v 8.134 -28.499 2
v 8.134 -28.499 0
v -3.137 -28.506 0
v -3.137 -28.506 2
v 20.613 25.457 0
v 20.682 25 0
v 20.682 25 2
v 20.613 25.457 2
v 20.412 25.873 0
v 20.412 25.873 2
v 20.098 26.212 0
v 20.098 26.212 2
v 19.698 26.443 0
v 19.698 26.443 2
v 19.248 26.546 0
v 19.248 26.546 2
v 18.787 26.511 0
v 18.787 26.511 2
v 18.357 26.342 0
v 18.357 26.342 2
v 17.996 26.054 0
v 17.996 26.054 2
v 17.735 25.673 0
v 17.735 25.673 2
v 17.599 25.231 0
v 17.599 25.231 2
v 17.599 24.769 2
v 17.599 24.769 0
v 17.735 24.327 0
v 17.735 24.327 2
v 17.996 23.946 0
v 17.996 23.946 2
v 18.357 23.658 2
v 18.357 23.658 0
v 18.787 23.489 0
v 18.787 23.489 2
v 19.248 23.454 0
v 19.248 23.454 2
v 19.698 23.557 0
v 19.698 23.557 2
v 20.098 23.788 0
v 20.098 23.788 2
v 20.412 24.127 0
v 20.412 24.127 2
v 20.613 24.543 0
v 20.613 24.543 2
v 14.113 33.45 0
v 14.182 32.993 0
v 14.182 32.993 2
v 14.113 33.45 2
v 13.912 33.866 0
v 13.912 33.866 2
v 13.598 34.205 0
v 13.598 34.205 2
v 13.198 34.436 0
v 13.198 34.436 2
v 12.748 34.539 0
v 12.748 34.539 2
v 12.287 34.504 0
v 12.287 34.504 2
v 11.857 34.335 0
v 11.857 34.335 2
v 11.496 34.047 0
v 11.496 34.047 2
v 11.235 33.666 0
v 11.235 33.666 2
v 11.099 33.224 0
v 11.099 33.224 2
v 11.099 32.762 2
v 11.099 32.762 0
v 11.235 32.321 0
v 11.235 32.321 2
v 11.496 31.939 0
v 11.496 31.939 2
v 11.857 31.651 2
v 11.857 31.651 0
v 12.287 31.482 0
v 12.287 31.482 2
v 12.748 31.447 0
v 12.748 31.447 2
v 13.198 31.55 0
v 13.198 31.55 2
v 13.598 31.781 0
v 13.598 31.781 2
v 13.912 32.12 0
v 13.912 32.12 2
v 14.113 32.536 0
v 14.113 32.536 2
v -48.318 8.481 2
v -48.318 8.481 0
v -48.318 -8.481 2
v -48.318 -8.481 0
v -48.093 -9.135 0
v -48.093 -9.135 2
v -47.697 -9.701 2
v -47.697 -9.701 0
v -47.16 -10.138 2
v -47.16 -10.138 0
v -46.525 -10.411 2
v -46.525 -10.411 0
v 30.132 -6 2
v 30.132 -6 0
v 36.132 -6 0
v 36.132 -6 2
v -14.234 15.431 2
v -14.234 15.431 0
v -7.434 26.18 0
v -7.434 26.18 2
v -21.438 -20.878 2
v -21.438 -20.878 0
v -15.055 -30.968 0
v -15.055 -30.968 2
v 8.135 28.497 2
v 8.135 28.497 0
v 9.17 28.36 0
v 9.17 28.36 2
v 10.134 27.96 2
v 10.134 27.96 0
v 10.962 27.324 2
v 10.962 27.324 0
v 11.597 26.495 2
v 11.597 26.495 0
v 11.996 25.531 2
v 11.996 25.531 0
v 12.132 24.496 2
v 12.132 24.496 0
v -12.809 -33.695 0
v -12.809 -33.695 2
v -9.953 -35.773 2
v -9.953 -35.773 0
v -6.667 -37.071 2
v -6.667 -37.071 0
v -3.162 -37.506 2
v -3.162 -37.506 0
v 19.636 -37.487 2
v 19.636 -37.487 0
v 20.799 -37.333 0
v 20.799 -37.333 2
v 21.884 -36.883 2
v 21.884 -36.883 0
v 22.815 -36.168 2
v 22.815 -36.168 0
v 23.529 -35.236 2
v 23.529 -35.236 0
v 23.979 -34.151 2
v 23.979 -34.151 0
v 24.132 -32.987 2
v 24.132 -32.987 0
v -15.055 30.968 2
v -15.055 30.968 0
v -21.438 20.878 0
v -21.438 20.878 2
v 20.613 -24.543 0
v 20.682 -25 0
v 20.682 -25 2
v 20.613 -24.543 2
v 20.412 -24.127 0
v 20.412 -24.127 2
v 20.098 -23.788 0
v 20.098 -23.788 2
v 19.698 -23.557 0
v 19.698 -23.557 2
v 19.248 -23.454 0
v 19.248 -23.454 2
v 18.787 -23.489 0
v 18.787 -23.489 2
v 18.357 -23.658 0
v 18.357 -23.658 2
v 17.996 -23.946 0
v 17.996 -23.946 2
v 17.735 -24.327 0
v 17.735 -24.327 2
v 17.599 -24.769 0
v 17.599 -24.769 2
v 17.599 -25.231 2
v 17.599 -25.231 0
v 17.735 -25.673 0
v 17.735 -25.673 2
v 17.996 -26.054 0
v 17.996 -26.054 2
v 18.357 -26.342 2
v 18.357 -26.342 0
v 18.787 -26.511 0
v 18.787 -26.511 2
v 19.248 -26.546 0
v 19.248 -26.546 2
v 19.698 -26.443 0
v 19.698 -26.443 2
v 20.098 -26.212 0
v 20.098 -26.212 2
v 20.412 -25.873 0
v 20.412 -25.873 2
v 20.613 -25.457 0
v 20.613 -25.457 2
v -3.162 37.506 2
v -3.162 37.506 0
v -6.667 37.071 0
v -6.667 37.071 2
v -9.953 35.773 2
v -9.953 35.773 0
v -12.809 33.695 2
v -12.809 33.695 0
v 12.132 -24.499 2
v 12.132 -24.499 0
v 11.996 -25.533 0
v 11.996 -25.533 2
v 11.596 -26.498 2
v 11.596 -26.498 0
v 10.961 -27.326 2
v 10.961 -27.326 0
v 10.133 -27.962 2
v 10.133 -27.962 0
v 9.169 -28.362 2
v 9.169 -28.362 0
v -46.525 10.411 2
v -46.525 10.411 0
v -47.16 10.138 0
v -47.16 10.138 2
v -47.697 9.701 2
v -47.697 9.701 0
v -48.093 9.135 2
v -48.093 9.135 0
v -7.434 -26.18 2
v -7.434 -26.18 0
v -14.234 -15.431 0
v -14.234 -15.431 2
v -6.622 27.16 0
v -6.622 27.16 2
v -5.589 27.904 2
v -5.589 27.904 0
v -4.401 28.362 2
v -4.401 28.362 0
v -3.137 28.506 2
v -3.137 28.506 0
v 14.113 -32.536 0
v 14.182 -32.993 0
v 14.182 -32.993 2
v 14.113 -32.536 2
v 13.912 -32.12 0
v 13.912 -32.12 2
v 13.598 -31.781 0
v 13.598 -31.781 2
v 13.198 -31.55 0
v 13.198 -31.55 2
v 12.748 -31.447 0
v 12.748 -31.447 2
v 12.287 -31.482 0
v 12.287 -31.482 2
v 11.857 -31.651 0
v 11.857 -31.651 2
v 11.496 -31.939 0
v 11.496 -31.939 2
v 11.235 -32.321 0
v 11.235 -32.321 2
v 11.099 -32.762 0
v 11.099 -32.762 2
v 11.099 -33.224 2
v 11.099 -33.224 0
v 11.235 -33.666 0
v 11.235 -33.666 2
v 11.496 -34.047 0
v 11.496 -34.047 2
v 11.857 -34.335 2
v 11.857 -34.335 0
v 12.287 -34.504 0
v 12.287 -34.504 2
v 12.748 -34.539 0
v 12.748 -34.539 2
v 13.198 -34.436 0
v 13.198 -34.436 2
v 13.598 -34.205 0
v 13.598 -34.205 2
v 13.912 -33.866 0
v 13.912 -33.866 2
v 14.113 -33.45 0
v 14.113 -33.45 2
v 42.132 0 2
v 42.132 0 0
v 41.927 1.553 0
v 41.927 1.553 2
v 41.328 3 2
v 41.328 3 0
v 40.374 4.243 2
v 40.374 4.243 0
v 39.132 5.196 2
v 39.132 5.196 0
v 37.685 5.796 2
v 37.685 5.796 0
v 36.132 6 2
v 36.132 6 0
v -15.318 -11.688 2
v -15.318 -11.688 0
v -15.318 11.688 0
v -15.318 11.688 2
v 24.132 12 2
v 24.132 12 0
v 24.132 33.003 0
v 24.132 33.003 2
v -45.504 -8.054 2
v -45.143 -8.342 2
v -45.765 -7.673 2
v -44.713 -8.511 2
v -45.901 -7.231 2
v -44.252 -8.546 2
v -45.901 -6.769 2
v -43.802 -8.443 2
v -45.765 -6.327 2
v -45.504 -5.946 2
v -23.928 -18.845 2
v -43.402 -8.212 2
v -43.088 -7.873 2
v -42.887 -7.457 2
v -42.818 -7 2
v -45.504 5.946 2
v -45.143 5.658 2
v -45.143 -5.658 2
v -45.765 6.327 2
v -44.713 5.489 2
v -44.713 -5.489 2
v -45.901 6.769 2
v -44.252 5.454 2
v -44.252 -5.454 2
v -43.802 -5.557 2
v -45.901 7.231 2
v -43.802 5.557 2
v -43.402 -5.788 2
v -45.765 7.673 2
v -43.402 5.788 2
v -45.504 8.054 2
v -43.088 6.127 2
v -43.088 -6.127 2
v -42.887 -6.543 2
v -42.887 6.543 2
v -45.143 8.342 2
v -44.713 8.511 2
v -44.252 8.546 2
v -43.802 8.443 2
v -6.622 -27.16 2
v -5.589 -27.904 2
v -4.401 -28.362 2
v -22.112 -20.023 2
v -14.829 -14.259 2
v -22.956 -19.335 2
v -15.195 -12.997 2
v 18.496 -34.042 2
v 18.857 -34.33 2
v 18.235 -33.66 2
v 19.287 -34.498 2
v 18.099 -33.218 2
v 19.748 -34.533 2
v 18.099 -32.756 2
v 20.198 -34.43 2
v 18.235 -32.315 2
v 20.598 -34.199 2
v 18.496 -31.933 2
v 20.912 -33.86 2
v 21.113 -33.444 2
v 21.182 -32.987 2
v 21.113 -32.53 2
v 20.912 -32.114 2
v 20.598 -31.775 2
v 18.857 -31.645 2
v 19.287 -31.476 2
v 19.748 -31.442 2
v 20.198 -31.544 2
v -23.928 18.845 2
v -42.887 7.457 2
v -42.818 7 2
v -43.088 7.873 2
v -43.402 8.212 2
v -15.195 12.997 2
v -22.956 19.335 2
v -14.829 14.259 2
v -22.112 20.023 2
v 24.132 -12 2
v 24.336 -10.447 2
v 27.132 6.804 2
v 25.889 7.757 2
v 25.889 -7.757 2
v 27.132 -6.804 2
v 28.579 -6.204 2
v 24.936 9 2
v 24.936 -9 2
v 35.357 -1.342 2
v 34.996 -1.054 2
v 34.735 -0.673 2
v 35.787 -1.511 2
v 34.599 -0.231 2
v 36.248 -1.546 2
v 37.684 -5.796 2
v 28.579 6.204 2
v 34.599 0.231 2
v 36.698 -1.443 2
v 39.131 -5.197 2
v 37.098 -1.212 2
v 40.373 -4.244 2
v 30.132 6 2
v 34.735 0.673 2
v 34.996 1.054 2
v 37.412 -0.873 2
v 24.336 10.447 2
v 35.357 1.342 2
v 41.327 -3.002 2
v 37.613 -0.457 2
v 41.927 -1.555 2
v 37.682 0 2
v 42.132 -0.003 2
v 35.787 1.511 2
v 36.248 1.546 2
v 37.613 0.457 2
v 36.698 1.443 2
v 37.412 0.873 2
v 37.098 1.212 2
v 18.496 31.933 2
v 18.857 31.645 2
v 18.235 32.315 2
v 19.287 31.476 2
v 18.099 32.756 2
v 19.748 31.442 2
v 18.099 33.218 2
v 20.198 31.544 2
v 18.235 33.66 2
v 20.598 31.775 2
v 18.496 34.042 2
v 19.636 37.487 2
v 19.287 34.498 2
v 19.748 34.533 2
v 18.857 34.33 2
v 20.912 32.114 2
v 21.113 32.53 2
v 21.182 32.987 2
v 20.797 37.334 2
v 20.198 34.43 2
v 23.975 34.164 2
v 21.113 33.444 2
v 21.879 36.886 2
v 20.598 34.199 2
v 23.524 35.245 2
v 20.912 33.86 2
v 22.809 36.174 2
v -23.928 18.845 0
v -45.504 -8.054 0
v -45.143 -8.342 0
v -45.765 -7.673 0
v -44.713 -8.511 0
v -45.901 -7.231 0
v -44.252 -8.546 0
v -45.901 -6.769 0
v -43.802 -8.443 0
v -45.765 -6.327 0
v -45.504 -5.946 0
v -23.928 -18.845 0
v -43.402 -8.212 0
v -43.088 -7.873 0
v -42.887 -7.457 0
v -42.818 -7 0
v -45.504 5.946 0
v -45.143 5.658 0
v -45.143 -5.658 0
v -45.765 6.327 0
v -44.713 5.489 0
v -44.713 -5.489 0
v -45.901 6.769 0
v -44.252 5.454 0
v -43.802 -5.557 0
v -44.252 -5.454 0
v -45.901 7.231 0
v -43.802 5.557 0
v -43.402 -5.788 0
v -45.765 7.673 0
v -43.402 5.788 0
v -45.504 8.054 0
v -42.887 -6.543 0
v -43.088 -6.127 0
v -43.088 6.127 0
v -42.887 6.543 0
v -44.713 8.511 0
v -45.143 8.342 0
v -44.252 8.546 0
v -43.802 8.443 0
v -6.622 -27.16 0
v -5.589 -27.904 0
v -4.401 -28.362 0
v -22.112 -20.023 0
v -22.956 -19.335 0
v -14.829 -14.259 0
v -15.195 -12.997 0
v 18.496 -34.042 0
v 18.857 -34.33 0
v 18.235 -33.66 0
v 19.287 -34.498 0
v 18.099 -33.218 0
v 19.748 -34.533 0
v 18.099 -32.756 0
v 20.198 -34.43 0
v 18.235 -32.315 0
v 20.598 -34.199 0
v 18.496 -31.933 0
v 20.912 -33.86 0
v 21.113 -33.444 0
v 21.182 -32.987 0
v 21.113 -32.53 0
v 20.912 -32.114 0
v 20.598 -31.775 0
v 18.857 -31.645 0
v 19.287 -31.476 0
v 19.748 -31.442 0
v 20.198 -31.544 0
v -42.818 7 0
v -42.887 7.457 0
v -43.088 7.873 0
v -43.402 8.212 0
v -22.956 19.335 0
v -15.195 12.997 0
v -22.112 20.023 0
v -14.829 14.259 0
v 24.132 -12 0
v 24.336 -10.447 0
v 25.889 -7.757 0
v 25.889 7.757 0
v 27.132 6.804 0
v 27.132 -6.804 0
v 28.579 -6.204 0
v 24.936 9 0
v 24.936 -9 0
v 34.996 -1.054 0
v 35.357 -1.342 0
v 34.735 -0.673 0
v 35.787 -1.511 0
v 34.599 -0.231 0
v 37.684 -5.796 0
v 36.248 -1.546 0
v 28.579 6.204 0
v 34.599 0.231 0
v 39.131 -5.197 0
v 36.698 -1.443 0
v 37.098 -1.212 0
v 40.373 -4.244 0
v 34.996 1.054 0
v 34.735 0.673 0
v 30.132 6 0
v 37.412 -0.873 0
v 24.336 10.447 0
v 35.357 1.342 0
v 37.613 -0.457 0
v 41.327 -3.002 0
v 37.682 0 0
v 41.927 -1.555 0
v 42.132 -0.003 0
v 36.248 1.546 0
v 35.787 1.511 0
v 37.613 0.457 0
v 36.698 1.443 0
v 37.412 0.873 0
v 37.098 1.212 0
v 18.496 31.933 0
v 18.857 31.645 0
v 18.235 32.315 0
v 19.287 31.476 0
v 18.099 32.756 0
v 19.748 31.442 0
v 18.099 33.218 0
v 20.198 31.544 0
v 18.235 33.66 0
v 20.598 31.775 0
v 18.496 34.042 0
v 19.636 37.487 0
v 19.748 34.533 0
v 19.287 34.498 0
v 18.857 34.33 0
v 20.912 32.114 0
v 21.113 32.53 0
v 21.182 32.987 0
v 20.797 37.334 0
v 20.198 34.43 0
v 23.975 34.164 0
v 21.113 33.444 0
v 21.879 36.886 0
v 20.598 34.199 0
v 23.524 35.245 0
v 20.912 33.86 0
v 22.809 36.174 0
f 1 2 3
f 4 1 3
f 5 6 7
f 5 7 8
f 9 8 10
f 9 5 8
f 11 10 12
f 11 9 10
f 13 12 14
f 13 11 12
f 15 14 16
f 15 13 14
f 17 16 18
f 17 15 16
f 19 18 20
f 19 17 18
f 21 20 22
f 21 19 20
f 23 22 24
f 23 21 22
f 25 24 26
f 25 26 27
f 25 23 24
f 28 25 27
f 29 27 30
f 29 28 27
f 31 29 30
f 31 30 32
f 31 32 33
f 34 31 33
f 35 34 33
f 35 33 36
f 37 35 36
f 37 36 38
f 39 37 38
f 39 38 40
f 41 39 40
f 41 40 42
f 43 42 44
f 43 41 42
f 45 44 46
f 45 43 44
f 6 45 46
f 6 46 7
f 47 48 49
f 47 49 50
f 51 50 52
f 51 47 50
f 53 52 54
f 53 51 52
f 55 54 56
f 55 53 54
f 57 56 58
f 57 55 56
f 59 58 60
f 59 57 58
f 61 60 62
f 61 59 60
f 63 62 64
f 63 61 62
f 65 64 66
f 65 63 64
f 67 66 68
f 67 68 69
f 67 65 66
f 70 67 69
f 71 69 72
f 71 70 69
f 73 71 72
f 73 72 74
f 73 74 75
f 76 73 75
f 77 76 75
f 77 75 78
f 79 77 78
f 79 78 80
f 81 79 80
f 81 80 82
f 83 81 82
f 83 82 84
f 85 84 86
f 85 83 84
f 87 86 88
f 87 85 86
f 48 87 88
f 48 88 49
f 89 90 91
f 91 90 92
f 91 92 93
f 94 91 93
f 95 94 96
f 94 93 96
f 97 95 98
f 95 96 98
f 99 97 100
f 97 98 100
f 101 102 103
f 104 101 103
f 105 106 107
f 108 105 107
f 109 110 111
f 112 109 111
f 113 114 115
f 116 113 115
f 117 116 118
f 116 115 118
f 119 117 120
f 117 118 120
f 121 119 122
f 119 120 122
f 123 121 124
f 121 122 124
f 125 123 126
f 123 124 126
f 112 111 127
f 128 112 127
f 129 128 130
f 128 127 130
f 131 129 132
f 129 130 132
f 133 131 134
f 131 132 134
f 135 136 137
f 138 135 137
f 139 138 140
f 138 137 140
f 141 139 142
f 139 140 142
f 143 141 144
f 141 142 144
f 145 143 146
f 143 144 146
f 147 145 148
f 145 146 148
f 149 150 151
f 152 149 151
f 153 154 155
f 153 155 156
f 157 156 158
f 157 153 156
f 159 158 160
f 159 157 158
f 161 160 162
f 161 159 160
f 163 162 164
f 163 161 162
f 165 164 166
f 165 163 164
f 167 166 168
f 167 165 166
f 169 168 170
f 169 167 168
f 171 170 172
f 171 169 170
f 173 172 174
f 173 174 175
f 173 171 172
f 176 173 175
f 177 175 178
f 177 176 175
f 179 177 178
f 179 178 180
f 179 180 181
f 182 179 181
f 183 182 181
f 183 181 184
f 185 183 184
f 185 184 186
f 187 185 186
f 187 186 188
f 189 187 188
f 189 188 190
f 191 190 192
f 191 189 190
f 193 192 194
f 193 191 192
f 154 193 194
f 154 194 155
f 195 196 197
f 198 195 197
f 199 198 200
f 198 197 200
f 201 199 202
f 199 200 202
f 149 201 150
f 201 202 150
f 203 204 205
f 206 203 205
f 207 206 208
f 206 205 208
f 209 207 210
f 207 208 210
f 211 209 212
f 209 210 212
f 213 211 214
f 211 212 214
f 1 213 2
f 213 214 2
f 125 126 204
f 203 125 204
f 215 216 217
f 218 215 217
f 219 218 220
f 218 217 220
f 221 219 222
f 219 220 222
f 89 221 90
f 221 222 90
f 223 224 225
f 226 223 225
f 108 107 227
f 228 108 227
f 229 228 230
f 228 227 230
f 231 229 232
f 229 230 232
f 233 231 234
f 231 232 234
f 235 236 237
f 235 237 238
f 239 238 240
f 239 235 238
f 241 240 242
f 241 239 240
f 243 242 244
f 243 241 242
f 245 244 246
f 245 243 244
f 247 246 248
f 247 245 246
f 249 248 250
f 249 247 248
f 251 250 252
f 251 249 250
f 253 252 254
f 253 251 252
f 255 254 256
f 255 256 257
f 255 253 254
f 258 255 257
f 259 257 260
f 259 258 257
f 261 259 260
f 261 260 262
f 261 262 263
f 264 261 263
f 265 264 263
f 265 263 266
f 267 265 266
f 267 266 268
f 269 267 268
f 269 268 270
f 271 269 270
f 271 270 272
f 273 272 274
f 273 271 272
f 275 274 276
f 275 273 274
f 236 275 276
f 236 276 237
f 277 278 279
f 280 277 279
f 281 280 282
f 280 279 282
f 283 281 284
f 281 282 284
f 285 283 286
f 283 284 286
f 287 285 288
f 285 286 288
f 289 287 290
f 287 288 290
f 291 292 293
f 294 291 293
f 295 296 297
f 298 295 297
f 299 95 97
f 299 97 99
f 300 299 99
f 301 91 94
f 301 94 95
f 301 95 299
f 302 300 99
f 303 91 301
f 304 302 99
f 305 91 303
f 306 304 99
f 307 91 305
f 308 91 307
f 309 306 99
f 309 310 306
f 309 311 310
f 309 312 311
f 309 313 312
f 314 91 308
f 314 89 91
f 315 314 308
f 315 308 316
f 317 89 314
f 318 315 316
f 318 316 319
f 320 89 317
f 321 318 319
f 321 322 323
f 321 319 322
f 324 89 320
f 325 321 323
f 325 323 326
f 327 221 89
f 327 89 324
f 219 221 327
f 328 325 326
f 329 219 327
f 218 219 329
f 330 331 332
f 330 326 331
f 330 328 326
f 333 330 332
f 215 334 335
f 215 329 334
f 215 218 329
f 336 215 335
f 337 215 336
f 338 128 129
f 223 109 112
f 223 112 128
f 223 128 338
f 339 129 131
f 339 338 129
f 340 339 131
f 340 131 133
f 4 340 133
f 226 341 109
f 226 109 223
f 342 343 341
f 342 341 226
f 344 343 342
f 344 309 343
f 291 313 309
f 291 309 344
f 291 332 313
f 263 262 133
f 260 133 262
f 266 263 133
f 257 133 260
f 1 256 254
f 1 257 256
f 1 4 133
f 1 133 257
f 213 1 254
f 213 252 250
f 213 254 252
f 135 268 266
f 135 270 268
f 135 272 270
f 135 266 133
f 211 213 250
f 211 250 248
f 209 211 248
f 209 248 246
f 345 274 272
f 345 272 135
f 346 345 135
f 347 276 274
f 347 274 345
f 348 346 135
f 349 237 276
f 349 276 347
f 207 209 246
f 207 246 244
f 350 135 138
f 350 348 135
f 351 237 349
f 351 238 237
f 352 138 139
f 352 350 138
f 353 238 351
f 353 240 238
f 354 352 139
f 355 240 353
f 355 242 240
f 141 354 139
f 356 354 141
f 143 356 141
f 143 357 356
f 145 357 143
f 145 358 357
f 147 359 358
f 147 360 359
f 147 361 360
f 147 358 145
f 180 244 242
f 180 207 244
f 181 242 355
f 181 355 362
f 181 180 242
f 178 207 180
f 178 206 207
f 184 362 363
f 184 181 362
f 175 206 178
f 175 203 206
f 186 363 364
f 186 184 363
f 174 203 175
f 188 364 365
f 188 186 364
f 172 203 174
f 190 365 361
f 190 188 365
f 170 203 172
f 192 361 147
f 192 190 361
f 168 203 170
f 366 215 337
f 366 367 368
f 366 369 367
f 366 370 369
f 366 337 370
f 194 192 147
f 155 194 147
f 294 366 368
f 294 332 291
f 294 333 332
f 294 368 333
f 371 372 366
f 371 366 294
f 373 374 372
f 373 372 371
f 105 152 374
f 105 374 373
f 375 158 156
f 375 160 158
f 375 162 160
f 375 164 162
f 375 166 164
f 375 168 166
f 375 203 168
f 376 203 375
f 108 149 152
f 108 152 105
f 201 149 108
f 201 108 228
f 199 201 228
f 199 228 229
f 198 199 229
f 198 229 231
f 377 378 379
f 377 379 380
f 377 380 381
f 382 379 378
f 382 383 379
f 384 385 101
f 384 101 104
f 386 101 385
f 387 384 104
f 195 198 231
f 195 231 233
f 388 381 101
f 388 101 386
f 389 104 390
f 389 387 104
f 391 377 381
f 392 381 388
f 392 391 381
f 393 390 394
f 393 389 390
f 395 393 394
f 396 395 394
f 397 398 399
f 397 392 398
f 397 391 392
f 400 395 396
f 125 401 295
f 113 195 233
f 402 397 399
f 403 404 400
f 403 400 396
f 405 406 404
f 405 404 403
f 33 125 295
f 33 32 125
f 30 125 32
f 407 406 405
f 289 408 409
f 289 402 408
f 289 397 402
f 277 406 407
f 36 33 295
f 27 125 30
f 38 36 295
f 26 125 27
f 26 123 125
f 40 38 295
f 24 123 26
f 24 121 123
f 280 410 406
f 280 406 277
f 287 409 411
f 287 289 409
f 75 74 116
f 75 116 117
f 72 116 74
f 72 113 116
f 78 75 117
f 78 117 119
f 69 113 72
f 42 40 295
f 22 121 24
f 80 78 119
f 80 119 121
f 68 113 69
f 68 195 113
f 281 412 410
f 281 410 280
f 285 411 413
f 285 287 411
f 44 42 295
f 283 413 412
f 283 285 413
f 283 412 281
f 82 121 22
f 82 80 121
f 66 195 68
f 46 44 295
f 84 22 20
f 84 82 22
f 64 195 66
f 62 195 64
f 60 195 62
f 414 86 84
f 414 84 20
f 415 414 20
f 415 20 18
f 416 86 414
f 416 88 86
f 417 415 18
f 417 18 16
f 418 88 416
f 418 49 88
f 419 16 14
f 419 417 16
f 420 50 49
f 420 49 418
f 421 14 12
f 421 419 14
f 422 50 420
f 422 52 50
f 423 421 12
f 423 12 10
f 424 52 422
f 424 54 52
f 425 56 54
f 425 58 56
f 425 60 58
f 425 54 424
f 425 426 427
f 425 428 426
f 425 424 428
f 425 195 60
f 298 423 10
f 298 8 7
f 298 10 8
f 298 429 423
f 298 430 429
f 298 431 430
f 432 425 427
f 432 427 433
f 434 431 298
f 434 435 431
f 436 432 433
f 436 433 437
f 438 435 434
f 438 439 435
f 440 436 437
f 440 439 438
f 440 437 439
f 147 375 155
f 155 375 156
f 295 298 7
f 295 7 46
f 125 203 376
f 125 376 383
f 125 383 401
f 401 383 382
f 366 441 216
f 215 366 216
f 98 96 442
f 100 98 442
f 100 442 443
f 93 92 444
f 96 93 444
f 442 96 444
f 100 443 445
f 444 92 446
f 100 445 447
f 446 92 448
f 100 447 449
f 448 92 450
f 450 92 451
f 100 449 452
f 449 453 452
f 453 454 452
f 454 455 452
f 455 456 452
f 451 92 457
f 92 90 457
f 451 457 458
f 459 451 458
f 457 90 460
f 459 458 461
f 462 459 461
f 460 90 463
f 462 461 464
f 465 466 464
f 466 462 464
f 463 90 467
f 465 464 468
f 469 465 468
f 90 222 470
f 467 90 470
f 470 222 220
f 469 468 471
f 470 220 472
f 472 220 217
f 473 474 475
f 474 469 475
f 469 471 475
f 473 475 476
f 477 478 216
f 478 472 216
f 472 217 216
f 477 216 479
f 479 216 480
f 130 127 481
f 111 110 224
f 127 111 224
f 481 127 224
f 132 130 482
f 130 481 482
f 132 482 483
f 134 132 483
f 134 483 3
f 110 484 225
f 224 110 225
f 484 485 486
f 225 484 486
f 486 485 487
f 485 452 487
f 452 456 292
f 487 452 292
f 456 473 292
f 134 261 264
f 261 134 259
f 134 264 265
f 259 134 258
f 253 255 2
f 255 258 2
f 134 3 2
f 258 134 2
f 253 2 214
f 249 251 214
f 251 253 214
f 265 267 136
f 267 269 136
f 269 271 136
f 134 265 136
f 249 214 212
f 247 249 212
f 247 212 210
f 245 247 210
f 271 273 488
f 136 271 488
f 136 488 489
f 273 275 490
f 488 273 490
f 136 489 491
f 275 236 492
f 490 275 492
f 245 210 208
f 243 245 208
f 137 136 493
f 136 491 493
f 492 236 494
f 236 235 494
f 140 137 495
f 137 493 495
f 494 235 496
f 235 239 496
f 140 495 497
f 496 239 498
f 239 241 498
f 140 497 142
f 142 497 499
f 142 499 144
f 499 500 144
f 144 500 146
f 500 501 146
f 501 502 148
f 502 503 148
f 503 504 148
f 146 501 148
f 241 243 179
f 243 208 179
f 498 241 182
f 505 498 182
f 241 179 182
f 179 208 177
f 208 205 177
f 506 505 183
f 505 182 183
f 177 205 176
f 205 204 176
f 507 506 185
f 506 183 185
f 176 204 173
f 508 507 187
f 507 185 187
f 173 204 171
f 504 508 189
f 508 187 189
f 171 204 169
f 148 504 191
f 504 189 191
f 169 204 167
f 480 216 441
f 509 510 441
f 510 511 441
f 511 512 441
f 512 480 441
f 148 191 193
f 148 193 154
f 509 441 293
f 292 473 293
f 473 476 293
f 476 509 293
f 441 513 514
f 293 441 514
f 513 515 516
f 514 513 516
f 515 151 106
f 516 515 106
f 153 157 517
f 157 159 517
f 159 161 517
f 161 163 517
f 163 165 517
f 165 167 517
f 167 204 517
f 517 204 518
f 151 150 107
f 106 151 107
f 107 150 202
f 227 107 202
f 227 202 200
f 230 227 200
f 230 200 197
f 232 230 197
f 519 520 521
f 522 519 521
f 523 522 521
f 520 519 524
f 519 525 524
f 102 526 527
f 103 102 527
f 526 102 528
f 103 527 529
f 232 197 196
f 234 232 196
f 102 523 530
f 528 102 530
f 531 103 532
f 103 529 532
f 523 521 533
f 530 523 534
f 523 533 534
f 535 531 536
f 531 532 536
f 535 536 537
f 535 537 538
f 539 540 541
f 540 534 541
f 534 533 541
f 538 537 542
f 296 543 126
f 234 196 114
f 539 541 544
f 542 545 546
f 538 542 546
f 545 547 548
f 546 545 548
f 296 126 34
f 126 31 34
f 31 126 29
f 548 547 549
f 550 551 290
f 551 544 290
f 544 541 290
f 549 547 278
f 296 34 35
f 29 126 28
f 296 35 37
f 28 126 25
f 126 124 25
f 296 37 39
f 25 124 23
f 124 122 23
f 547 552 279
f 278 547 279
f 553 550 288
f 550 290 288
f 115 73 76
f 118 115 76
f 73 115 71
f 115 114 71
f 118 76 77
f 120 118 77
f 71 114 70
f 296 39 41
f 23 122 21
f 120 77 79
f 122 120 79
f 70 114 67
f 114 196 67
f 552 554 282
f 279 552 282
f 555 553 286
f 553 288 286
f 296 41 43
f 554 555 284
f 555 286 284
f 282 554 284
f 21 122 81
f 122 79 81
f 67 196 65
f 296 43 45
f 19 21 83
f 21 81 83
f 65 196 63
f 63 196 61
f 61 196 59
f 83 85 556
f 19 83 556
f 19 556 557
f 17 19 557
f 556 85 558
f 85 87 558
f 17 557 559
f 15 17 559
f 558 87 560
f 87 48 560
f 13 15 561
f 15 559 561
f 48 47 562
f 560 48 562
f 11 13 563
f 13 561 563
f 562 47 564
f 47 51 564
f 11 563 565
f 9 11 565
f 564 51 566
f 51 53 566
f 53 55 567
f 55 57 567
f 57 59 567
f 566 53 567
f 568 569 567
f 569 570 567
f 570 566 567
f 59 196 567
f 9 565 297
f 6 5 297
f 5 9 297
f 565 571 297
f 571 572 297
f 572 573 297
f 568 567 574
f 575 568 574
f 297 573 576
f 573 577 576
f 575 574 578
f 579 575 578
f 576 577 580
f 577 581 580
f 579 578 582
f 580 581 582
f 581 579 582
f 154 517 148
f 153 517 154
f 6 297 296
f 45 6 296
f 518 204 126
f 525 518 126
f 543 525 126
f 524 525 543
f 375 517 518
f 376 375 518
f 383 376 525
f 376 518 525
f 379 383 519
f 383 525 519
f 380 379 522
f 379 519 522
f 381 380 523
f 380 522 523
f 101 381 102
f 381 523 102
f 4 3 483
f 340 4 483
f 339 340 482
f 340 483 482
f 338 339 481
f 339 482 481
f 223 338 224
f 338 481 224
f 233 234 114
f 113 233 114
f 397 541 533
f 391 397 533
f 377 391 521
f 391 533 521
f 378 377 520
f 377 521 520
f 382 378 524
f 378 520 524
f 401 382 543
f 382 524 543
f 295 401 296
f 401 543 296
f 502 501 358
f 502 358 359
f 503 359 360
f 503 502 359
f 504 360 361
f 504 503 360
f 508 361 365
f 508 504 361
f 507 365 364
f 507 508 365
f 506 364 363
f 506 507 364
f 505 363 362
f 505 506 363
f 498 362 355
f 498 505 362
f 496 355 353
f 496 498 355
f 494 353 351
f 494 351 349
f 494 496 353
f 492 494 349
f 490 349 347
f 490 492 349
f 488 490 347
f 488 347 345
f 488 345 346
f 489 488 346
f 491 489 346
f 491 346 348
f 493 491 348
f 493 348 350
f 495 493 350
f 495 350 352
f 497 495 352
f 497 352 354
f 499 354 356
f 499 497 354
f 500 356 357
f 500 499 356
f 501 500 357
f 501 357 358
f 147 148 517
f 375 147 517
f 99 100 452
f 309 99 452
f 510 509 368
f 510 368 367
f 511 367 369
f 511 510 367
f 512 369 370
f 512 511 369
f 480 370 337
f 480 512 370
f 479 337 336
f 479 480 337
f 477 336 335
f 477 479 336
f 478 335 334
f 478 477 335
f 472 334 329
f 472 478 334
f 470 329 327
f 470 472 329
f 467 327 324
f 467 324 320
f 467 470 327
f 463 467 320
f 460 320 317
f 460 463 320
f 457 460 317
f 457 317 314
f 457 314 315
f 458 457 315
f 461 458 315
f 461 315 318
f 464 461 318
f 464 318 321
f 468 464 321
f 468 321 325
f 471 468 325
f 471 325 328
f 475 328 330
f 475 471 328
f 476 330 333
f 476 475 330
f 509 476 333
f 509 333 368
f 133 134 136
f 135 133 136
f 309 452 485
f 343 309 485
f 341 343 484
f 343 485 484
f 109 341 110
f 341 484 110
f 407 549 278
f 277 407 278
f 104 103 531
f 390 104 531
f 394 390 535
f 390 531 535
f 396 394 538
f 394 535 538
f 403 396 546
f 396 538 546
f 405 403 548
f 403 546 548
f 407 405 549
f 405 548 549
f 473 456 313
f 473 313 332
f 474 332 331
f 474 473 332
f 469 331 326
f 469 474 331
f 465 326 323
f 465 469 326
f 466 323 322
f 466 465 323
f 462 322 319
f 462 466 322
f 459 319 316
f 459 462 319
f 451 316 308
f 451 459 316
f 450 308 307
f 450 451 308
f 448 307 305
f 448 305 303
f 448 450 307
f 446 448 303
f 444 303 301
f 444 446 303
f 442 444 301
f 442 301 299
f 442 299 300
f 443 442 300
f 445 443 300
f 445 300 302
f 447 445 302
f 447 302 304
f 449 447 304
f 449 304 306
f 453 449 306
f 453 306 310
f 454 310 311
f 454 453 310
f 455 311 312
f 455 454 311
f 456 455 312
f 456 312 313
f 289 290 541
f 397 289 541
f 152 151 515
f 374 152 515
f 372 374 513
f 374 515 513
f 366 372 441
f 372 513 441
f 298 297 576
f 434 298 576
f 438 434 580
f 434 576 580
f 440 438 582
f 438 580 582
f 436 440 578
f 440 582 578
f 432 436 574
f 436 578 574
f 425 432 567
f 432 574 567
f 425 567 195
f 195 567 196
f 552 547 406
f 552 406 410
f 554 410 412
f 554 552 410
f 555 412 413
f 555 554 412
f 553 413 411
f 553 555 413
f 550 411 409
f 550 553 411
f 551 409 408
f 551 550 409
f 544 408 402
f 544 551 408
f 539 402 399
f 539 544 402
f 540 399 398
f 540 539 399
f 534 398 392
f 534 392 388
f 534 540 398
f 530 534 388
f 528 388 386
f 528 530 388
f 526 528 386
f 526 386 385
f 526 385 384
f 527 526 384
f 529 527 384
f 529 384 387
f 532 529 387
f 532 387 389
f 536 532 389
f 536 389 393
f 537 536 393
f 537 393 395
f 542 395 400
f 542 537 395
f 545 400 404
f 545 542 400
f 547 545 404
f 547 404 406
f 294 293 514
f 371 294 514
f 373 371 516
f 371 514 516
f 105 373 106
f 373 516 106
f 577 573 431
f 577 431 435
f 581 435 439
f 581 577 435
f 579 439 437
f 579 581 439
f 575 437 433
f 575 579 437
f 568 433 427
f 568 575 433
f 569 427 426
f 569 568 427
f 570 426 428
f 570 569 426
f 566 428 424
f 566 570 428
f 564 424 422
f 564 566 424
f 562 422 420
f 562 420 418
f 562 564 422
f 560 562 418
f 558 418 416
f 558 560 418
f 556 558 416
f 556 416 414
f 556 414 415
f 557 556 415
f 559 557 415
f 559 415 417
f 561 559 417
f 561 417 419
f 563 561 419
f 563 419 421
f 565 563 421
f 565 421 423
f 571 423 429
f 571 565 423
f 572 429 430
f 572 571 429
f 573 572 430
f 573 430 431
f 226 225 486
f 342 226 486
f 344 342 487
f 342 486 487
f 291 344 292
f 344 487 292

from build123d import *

# Parameters (mm, degrees)
F0_R     = 1.55
F1_DEPTH = 2


# Not quite as in the source:
# - ends of sketch curves that miss each other by under 0.0002 mm in the source are joined


with BuildPart() as f1:
    # F0 (on Top) → F1 (new body)
    with BuildSketch(Plane.XY):
        with BuildLine():
            Line((24.1317584196, 12.0030992724), (24.1317584196, 33.0030992724))
            ThreePointArc((24.1317584196, 33.0030992724), (22.8094861976, 36.1735119864), (19.6355297082, 37.4872550396))
            Line((19.6355297082, 37.4872550396), (-3.1620066842, 37.5062195601))
            ThreePointArc((-3.1620066842, 37.5062195601), (-9.952633868, 35.7733094648), (-15.054516581, 30.9684798394))
            Line((-15.054516581, 30.9684798394), (-21.4377415602, 20.8777601542))
            ThreePointArc((-21.4377415602, 20.8777601542), (-22.515185711, 19.6558592058), (-23.9282391339, 18.8451756363))
            Line((-23.9282391339, 18.8451756363), (-46.5253097099, 10.4110515716))
            ThreePointArc((-46.5253097099, 10.4110515716), (-47.6965598622, 9.7014043841), (-48.3182136925, 8.4811697487))
            Line((-48.3182136925, 8.4811697487), (-48.3182136925, -8.4811697487))
            ThreePointArc((-48.3182136925, -8.4811697487), (-47.6965598622, -9.7014043841), (-46.5253097099, -10.4110515716))
            Line((-46.5253097099, -10.4110515716), (-23.9282391339, -18.8451756363))
            ThreePointArc((-23.9282391339, -18.8451756363), (-22.515185711, -19.6558592058), (-21.4377415602, -20.8777601542))
            Line((-21.4377415602, -20.8777601542), (-15.054516581, -30.9684798394))
            ThreePointArc((-15.054516581, -30.9684798394), (-9.952633868, -35.7733094648), (-3.1620066842, -37.5062195601))
            Line((-3.1620066842, -37.5062195601), (19.6355018203, -37.4872550628))
            ThreePointArc((19.6355018203, -37.4872550628), (22.8150621518, -36.1679133678), (24.1317584196, -32.9872566198))
            Line((24.1317584196, -32.9872566198), (24.1317584196, -12.0030992724))
            Line((24.1317584196, -12.0030992724), (24.1317584196, -12))
            ThreePointArc((24.1317584196, -12), (25.8891177325, -7.7573593129), (30.1317584196, -6))
            Line((30.1317584196, -6), (36.1317584196, -6))
            ThreePointArc((36.1317584196, -6), (40.3733032071, -4.2437363038), (42.1317576192, -0.003099272))
            Line((42.1317576192, -0.003099272), (42.1317584196, 0))
            ThreePointArc((42.1317584196, 0), (40.3743991067, 4.2426406871), (36.1317584196, 6))
            Line((36.1317584196, 6), (30.1317584196, 6))
            ThreePointArc((30.1317584196, 6), (25.8891177325, 7.7573593129), (24.1317584196, 12))
            Line((24.1317584196, 12), (24.1317584196, 12.0030992724))
        make_face()
        with Locations((-44.3682136925, -7)):
            Circle(F0_R, mode=Mode.SUBTRACT)
        with Locations((12.6317863075, -32.9930796663)):
            Circle(F0_R, mode=Mode.SUBTRACT)
        with Locations((19.1317584196, -25)):
            Circle(F0_R, mode=Mode.SUBTRACT)
        with Locations((19.6317863075, -32.9872565966)):
            Circle(F0_R, mode=Mode.SUBTRACT)
        with Locations((-44.3682136925, 7)):
            Circle(F0_R, mode=Mode.SUBTRACT)
        with BuildLine():
            Line((-14.2339508783, 15.4306240067), (-7.4342503505, 26.1797159146))
            ThreePointArc((-7.4342503505, 26.1797159146), (-5.5889861734, 27.9038009834), (-3.1365199939, 28.5061952445))
            Line((-3.1365199939, 28.5061952445), (8.1350859734, 28.4968187664))
            ThreePointArc((8.1350859734, 28.4968187664), (10.9616557954, 27.323776346), (12.1317584196, 24.4959882833))
            Line((12.1317584196, 24.4959882833), (12.1317584196, -24.4985477622))
            ThreePointArc((12.1317584196, -24.4985477622), (10.9611450551, -27.3260150506), (8.1344727862, -28.4985468413))
            Line((8.1344727862, -28.4985468413), (-3.1365199939, -28.5061952445))
            ThreePointArc((-3.1365199939, -28.5061952445), (-5.5889861734, -27.9038009834), (-7.4342503505, -26.1797159146))
            Line((-7.4342503505, -26.1797159146), (-14.2339508783, -15.4306240067))
            ThreePointArc((-14.2339508783, -15.4306240067), (-15.0416860208, -13.6364803831), (-15.3182136925, -11.688424981))
            Line((-15.3182136925, -11.688424981), (-15.3182136925, 11.688424981))
            ThreePointArc((-15.3182136925, 11.688424981), (-15.0416860208, 13.6364803831), (-14.2339508783, 15.4306240067))
        make_face(mode=Mode.SUBTRACT)
        with Locations((36.1317584196, 0)):
            Circle(F0_R, mode=Mode.SUBTRACT)
        with Locations((19.1317584196, 25)):
            Circle(F0_R, mode=Mode.SUBTRACT)
        with Locations((12.6317863075, 32.9930796663)):
            Circle(F0_R, mode=Mode.SUBTRACT)
        with Locations((19.6317863075, 32.9872565966)):
            Circle(F0_R, mode=Mode.SUBTRACT)
    extrude(amount=F1_DEPTH)


solid = f1.part
